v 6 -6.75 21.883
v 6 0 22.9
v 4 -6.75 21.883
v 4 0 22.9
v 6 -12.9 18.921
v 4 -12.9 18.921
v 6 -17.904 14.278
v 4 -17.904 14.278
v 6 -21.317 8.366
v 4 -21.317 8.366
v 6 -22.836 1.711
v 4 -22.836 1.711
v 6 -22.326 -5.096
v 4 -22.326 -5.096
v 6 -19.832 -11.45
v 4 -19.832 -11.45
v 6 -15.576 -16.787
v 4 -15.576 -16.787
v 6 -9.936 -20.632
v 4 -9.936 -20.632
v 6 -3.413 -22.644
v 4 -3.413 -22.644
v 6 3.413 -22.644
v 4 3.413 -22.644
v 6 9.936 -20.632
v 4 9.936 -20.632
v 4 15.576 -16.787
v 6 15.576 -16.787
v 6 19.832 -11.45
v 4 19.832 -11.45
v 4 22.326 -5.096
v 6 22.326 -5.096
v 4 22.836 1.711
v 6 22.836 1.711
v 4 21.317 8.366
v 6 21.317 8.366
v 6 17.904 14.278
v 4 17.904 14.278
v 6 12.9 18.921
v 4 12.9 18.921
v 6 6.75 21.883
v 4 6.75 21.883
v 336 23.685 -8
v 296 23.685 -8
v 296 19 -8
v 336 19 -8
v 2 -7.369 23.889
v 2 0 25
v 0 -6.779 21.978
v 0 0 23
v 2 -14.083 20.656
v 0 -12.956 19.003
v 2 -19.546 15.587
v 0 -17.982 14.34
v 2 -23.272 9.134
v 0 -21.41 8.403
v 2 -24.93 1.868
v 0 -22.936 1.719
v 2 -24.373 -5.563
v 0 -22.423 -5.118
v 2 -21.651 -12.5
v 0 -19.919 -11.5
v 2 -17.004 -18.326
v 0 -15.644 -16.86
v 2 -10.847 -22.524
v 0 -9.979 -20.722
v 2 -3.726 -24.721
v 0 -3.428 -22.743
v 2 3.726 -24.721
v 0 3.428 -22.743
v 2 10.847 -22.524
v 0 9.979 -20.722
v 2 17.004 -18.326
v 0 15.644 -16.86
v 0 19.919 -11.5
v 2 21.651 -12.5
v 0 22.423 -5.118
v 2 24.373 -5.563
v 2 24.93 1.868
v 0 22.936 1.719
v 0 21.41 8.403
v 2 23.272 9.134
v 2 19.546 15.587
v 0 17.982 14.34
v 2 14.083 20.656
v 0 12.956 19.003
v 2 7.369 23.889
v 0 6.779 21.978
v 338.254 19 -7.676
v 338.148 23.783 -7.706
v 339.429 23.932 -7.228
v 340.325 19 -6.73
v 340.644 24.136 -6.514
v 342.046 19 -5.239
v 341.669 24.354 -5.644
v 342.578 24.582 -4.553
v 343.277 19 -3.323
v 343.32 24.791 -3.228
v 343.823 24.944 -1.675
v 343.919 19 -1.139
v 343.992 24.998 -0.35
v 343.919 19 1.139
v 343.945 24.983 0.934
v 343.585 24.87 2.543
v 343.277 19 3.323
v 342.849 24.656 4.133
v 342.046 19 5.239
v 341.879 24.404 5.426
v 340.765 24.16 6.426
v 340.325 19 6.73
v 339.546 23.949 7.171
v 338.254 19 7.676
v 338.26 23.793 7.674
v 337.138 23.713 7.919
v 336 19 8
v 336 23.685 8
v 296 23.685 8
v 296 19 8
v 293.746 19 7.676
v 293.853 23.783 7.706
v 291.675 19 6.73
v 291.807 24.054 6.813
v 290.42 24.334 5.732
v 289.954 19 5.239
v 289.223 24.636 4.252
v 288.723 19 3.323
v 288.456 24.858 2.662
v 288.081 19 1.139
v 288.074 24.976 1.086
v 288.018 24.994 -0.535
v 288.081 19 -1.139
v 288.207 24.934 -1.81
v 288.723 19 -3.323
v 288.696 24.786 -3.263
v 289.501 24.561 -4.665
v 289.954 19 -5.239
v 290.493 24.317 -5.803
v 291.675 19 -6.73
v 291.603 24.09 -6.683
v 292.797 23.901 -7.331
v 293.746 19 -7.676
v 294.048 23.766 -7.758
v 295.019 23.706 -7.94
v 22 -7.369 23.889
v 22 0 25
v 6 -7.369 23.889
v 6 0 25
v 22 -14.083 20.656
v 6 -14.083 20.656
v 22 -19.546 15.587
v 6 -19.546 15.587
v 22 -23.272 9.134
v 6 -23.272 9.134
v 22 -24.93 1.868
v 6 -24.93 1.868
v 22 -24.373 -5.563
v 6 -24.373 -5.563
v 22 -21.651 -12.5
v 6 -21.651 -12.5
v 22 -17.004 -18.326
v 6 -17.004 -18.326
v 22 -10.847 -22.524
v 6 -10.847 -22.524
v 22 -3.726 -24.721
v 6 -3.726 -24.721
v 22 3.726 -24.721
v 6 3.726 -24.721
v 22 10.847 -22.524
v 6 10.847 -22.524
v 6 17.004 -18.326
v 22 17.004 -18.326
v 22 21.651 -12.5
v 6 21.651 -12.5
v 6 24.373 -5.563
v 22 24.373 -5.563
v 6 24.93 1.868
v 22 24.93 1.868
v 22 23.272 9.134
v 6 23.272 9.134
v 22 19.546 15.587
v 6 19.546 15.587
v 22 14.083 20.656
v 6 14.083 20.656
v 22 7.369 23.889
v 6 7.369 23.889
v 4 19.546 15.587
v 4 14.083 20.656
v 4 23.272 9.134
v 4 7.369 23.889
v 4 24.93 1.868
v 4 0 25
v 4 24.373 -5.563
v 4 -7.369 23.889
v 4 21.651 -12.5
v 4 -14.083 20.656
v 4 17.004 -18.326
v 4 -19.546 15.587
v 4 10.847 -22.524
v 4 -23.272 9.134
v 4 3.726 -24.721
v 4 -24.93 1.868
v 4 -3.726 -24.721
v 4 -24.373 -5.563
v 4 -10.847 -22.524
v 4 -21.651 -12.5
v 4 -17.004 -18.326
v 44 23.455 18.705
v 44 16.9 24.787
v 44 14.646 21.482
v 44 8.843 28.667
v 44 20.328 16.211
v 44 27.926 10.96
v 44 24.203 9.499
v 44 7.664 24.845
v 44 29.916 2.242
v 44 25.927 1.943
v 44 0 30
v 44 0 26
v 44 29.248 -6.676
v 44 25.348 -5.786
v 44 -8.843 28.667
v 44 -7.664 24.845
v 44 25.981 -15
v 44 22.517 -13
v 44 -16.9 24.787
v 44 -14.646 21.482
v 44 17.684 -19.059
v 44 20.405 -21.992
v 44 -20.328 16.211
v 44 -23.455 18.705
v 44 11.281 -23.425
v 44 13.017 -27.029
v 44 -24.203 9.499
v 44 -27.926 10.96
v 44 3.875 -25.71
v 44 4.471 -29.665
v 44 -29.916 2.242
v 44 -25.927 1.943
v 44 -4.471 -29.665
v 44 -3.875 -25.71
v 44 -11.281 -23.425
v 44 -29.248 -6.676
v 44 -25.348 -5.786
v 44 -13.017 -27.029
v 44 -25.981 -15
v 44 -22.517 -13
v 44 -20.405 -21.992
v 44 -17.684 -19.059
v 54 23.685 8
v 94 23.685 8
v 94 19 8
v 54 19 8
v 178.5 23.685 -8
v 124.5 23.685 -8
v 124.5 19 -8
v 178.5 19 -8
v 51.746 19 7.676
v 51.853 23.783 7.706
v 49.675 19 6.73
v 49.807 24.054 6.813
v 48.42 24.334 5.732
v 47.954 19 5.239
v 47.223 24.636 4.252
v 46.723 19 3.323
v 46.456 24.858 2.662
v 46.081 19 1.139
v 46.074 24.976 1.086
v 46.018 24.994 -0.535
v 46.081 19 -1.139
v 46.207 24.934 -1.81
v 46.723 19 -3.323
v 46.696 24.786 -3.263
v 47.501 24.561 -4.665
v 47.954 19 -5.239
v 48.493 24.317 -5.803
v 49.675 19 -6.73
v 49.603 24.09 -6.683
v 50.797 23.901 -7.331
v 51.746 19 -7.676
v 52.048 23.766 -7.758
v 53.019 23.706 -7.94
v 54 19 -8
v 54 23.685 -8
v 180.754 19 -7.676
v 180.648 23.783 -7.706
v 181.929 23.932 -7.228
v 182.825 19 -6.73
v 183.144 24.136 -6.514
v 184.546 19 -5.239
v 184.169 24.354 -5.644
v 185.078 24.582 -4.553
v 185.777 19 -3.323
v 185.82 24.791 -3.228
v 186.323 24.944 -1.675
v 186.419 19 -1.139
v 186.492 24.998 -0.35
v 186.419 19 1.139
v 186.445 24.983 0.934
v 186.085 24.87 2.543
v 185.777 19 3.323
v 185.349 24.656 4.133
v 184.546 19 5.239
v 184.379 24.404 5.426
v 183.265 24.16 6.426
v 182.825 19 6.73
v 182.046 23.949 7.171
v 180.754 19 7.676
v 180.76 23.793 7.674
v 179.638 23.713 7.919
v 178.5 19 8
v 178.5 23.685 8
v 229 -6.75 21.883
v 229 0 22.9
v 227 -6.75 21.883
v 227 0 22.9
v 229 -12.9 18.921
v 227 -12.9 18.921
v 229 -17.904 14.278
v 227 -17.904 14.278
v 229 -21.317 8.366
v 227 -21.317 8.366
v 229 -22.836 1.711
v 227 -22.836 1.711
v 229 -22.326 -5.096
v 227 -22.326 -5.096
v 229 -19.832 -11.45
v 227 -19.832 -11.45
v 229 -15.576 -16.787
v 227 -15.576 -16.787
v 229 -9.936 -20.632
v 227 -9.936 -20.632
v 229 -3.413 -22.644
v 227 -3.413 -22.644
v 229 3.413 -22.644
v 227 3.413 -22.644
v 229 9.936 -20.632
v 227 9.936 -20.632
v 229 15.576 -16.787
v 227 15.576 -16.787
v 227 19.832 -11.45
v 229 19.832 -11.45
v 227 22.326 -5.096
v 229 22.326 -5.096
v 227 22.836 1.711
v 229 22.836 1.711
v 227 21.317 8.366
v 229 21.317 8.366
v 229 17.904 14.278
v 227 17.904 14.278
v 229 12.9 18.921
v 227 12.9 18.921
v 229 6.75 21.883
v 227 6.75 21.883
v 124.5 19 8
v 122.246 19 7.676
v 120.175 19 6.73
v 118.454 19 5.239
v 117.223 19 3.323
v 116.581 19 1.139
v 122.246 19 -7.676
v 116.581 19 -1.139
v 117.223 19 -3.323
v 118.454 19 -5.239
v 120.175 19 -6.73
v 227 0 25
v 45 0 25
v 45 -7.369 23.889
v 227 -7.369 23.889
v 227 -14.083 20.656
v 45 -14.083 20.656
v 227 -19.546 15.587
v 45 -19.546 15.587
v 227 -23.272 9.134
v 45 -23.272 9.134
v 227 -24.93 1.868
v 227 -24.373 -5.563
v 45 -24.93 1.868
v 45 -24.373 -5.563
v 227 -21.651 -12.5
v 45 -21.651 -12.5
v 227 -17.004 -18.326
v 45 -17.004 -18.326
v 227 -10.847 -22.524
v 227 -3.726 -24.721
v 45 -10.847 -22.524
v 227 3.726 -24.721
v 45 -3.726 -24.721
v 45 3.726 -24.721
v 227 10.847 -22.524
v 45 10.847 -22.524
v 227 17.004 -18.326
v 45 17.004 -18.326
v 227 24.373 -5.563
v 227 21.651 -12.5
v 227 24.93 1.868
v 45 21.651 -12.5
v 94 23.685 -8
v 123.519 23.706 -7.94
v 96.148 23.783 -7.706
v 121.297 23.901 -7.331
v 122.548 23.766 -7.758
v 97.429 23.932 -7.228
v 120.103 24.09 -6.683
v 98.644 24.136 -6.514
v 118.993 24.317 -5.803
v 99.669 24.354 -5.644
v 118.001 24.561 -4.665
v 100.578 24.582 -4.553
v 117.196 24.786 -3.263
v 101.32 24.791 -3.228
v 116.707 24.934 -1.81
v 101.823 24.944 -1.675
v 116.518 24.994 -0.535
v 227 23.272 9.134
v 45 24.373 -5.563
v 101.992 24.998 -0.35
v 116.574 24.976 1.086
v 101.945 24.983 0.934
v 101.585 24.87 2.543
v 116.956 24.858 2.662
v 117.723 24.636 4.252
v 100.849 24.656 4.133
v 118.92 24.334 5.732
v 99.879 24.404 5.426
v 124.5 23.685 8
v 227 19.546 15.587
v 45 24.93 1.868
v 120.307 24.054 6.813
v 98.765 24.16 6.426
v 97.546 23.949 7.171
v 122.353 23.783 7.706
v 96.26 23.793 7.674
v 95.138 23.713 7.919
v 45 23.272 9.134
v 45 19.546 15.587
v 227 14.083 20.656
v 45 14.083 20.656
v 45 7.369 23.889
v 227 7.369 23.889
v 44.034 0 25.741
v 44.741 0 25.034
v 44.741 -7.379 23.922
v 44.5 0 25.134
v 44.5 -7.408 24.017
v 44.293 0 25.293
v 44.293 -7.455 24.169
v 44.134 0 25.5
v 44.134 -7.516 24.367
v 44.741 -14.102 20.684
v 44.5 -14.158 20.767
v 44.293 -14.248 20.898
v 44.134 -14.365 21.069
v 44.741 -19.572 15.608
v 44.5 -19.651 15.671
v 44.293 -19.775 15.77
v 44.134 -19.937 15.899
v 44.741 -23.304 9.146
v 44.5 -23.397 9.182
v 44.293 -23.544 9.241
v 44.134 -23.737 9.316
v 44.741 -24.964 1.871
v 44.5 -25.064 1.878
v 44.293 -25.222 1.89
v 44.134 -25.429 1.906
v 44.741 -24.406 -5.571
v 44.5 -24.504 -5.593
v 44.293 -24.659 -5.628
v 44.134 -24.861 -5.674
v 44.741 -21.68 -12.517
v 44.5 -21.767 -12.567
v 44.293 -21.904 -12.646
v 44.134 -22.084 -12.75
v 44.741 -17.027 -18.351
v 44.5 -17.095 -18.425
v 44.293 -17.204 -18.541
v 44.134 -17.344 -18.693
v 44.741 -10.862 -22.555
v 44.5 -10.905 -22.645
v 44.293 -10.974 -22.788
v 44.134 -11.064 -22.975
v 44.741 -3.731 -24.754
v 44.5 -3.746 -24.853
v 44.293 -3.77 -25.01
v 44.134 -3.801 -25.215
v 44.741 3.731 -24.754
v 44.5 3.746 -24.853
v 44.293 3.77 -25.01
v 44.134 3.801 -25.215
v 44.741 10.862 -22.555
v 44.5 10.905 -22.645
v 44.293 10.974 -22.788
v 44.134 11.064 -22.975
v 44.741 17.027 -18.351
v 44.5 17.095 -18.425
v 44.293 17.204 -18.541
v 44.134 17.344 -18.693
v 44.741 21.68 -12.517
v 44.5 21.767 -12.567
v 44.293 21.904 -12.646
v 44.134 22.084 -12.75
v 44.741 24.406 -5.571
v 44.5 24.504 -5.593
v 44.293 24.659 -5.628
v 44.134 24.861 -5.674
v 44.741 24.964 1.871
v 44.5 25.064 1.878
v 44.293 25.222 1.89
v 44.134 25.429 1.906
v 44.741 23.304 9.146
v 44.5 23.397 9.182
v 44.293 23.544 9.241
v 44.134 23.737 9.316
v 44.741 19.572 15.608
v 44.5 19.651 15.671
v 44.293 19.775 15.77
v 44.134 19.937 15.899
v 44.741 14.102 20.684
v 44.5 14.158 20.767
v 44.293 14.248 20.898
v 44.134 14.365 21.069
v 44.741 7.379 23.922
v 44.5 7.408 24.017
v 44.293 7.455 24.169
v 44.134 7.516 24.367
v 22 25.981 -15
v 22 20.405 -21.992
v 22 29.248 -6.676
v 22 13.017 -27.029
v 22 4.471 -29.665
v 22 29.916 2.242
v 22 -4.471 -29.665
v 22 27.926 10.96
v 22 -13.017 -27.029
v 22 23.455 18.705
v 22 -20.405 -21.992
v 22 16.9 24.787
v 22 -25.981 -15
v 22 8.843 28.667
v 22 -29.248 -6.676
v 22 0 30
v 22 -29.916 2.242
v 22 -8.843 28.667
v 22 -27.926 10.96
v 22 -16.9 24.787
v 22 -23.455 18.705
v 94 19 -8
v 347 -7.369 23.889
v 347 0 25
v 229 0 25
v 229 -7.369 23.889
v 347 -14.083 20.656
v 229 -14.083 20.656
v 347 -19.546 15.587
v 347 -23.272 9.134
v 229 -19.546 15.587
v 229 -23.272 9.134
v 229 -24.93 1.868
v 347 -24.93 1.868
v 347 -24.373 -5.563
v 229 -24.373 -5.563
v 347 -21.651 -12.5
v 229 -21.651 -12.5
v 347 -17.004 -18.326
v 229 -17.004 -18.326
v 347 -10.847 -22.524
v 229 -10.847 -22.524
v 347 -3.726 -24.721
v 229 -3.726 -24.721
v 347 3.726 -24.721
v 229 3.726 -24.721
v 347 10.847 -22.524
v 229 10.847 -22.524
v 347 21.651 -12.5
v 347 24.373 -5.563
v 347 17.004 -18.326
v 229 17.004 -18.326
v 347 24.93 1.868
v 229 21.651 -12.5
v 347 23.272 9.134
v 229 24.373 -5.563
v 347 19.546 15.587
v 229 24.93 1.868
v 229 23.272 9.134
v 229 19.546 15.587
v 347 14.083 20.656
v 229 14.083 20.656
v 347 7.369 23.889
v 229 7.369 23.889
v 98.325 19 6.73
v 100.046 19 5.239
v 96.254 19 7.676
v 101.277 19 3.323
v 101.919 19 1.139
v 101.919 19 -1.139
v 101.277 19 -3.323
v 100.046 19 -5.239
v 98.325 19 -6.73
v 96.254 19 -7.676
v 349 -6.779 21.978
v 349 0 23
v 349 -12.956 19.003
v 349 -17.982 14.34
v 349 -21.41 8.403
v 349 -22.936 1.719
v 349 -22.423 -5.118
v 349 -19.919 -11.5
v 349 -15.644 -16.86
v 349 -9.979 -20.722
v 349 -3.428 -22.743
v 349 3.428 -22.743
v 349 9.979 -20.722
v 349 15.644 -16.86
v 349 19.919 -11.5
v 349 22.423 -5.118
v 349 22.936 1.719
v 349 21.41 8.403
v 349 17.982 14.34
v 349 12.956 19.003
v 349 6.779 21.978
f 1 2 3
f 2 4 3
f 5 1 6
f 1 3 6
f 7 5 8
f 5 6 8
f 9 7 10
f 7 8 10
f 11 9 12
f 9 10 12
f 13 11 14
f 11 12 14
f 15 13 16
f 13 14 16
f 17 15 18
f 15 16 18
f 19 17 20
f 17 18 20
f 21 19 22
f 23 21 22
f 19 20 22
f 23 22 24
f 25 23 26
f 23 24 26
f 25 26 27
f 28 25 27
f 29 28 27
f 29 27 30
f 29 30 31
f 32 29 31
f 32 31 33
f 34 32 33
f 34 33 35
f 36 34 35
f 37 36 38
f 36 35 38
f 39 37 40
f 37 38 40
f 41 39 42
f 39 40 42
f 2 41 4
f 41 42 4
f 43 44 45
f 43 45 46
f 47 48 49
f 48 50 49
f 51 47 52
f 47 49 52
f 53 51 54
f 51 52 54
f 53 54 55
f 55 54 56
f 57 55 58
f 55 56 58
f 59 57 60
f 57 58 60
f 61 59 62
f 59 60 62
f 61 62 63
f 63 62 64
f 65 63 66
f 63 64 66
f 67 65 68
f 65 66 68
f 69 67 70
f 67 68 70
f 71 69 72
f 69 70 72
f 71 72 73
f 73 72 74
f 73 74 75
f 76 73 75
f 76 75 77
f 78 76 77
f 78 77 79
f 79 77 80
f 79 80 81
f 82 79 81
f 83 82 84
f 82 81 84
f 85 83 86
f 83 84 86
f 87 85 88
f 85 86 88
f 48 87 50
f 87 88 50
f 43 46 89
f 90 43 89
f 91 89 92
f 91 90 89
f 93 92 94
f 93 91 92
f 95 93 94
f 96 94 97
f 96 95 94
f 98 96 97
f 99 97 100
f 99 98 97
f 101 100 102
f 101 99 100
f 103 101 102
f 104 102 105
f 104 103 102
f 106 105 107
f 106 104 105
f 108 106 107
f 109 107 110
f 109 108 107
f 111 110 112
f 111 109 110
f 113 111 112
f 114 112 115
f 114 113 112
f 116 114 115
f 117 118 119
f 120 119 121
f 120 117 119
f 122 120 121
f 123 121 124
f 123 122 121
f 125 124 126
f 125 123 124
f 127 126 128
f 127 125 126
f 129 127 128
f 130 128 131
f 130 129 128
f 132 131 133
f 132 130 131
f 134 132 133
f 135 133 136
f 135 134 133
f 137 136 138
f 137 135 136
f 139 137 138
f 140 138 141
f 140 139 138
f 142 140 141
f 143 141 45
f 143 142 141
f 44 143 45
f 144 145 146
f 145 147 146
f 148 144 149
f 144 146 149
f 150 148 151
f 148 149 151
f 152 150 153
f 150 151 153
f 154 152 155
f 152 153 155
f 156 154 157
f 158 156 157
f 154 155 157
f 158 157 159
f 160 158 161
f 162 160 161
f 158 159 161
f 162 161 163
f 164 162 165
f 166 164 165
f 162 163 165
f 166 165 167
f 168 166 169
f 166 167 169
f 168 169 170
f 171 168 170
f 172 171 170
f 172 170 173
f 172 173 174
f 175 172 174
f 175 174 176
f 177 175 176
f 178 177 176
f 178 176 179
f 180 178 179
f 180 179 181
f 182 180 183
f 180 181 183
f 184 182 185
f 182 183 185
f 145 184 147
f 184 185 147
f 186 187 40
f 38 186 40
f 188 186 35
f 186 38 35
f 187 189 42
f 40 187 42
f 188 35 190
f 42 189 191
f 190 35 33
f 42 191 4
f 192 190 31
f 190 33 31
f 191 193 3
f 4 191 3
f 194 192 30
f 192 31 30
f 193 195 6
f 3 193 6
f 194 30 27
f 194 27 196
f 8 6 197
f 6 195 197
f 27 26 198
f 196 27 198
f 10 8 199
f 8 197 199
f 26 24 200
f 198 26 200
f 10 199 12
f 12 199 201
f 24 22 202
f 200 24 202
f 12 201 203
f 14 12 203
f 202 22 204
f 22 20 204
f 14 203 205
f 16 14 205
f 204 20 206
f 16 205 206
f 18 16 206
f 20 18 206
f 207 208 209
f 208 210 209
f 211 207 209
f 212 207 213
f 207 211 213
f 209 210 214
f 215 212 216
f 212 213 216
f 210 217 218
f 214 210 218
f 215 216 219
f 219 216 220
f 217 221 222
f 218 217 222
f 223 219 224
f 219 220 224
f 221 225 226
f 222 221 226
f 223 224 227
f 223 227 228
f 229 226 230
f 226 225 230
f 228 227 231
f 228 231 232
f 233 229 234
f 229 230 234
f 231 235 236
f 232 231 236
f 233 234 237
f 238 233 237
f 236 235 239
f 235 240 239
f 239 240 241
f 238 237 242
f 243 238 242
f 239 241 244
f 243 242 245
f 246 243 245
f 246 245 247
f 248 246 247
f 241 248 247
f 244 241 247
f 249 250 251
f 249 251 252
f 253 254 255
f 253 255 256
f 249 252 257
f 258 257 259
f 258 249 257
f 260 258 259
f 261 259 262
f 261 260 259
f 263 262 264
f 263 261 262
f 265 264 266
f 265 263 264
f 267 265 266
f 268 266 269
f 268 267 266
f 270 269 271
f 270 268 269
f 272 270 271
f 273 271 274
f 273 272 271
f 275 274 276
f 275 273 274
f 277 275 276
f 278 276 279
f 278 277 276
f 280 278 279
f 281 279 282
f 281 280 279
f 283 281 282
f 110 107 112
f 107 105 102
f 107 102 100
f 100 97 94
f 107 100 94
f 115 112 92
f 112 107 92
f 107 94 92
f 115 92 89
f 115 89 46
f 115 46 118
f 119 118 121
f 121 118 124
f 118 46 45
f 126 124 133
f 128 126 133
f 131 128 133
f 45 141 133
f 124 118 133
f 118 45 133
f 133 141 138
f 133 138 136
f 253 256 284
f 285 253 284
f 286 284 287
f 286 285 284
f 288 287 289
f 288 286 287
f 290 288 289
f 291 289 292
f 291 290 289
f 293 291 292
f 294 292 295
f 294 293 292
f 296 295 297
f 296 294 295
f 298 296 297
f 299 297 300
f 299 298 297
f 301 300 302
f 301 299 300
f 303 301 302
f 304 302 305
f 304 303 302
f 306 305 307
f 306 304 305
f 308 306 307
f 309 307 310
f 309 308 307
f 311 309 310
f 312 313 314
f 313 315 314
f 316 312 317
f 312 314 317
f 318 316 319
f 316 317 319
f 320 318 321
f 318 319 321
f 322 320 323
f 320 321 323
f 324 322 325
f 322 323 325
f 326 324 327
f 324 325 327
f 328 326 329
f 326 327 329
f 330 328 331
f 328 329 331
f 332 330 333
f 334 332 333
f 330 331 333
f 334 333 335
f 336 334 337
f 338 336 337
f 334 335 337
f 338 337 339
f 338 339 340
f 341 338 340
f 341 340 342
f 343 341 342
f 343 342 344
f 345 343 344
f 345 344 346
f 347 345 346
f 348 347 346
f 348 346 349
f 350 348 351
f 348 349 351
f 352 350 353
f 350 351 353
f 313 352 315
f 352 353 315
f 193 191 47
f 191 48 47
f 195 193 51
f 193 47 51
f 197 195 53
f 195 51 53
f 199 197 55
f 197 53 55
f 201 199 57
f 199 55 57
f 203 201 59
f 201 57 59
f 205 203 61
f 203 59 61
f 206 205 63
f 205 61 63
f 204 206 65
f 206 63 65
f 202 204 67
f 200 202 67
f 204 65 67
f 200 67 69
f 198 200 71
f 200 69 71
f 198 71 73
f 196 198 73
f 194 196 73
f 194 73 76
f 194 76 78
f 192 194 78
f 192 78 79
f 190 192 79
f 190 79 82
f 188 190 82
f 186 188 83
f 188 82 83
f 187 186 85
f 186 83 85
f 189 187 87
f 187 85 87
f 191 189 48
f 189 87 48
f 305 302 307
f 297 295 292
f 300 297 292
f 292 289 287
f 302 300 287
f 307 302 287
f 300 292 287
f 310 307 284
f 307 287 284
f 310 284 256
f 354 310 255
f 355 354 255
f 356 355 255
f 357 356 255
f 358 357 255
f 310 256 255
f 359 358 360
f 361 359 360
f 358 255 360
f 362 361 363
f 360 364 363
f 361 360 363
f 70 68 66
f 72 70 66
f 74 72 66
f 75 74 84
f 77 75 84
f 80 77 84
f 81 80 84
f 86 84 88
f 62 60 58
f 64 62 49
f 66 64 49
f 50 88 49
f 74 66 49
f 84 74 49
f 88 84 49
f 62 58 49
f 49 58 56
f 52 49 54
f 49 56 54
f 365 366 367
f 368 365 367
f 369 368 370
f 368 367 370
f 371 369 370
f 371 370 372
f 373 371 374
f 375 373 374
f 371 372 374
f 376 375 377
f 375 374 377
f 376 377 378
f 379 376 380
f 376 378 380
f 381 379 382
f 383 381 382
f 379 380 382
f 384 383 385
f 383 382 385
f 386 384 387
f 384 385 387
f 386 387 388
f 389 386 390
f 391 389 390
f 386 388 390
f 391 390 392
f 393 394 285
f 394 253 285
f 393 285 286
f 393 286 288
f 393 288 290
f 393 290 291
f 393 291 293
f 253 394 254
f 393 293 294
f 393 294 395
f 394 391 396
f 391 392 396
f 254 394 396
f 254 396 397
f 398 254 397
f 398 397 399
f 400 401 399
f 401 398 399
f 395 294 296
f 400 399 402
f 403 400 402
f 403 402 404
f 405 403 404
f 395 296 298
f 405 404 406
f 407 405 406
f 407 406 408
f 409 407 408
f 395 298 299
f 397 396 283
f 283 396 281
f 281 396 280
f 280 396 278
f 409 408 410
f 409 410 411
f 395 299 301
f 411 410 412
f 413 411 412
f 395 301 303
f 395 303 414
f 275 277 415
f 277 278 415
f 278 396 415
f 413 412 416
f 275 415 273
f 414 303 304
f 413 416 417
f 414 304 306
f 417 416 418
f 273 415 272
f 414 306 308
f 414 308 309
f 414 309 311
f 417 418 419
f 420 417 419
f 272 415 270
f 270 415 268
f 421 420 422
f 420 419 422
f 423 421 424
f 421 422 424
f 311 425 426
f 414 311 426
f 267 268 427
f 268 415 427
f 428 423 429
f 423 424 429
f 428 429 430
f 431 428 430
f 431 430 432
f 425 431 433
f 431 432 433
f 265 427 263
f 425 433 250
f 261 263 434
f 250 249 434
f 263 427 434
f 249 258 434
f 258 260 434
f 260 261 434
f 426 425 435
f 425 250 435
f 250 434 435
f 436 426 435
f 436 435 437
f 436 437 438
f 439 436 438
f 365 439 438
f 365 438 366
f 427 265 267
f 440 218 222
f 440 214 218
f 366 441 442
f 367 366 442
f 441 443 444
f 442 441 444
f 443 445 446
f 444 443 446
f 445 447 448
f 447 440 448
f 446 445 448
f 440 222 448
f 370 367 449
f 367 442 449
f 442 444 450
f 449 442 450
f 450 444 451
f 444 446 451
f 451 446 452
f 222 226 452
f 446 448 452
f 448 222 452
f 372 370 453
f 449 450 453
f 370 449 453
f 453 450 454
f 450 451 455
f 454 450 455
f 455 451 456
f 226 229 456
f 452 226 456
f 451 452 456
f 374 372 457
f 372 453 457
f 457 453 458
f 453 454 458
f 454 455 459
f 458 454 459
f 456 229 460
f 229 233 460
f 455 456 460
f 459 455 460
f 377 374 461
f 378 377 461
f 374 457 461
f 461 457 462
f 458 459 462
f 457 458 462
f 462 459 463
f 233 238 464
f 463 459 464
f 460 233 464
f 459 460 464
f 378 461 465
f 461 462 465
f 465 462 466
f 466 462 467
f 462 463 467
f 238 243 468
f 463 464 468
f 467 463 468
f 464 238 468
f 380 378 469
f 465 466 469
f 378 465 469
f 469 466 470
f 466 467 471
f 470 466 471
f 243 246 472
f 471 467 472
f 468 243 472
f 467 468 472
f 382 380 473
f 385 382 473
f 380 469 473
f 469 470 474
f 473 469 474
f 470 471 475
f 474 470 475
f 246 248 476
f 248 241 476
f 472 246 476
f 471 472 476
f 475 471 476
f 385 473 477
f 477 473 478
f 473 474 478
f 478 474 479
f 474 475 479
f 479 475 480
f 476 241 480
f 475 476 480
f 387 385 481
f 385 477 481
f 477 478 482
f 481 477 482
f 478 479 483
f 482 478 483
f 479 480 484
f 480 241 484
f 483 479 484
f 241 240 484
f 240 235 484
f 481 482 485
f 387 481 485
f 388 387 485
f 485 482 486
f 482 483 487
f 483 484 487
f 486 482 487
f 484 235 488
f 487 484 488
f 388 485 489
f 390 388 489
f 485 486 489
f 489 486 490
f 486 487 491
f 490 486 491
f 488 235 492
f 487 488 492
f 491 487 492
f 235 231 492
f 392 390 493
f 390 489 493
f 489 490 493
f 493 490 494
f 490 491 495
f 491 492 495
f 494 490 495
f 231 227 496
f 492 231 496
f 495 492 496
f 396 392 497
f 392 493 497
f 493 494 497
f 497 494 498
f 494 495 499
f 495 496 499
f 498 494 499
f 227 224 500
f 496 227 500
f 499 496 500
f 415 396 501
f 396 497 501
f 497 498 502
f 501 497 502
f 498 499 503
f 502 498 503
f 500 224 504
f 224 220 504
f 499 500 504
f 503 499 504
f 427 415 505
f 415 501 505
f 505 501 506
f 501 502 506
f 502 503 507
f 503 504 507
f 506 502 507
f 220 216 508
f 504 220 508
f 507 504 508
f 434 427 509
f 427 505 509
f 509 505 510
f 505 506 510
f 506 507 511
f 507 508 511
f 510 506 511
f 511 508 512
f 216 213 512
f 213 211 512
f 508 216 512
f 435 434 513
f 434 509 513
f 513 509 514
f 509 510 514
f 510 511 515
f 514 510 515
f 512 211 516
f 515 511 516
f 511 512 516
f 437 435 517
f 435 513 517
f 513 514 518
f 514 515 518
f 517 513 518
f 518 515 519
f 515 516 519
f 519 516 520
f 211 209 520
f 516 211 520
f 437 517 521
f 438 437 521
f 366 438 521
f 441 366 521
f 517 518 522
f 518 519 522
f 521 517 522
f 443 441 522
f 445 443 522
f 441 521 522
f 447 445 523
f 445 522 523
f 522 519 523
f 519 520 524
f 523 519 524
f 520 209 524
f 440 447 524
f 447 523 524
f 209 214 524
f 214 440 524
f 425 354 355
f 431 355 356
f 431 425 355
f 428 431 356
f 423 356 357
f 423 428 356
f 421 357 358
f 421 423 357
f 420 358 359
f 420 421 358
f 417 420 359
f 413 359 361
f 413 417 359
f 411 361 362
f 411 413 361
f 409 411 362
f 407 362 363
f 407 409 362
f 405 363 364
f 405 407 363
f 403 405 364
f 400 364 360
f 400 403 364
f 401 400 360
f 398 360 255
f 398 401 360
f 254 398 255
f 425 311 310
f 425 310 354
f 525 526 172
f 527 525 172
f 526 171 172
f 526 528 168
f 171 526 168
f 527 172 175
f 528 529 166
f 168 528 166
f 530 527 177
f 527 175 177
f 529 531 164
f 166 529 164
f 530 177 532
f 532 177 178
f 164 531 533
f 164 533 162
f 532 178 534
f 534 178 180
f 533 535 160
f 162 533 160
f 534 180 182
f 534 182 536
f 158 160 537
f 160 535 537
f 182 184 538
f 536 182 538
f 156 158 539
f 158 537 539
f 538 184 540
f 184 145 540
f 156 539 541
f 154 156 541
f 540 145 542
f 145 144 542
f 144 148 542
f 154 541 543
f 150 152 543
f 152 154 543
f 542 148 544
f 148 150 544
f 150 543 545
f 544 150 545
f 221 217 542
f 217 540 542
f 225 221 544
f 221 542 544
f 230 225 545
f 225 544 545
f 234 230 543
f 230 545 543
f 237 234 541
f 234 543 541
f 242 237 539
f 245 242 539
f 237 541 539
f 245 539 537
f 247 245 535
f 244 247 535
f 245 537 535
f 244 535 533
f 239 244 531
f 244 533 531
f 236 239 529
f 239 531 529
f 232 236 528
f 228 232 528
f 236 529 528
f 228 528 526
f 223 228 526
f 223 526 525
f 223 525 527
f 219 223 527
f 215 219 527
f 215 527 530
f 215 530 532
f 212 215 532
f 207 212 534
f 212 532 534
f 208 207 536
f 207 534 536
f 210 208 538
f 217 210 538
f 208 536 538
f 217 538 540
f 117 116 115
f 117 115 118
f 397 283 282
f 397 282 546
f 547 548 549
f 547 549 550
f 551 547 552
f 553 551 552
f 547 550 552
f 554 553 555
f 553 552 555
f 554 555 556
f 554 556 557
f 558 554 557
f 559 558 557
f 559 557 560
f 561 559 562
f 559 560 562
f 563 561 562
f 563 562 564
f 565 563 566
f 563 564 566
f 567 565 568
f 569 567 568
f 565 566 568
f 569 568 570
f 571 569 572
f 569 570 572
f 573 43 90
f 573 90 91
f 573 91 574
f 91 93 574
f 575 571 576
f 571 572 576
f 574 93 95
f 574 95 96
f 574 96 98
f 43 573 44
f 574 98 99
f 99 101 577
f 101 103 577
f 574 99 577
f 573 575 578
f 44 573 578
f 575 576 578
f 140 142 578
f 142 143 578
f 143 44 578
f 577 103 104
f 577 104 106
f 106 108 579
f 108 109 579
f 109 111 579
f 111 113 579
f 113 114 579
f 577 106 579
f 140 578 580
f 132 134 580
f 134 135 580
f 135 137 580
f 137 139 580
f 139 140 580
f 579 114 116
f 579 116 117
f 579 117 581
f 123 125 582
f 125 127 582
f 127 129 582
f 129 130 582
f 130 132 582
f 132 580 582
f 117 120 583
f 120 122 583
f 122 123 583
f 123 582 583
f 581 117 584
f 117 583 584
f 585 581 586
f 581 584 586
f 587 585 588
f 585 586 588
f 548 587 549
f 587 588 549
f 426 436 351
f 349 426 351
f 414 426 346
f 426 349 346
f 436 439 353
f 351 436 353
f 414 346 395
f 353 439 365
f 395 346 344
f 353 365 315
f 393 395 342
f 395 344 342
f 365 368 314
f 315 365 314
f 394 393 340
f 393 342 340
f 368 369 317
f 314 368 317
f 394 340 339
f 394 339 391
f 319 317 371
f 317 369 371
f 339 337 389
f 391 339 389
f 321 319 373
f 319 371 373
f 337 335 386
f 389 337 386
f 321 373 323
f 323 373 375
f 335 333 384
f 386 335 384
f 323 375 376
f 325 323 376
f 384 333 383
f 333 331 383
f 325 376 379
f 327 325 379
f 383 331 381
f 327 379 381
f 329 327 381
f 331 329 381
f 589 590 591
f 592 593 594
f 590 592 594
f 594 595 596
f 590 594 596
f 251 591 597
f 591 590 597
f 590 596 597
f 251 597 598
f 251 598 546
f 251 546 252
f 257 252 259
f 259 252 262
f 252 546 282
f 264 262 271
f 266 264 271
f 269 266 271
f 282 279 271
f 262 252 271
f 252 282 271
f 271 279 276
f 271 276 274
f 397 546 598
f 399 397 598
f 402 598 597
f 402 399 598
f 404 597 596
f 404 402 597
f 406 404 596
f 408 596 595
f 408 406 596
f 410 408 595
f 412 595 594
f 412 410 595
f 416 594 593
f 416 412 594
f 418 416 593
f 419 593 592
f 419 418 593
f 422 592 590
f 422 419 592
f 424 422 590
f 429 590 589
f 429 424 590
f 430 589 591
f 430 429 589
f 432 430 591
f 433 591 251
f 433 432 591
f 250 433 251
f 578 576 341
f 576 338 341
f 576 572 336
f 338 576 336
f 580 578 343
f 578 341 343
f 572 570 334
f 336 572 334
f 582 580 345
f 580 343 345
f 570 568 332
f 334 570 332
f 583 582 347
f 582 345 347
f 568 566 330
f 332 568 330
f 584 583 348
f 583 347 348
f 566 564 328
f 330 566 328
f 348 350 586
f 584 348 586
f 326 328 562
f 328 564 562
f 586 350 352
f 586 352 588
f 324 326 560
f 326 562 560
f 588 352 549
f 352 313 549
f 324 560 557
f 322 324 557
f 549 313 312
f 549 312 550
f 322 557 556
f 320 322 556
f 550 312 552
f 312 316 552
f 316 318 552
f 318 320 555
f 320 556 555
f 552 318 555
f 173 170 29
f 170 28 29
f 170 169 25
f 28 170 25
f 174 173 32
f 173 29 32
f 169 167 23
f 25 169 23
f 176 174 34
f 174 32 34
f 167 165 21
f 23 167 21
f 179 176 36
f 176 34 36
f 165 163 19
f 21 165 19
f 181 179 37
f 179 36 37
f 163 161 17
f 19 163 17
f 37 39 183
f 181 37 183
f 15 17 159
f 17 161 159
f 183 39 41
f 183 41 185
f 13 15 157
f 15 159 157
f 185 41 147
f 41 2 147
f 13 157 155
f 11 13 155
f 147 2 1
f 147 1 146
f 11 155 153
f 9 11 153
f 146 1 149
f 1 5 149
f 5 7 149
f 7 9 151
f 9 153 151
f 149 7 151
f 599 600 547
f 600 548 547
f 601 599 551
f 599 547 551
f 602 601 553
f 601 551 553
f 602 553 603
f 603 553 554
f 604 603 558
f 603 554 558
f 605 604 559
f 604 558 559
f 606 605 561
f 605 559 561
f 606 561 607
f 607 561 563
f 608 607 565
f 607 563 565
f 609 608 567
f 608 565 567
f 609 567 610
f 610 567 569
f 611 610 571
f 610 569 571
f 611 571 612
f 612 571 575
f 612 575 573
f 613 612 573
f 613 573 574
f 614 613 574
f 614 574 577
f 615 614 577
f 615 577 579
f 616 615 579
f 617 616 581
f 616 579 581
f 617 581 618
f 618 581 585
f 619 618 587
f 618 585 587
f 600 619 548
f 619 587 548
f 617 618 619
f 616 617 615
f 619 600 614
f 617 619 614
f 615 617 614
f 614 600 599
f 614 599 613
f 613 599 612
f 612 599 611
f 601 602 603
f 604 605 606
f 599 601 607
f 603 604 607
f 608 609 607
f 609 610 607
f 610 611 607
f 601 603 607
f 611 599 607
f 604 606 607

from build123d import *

# Parameters (mm, degrees)
CUT_EXTRUDE1_DEPTH = 6
CUT_EXTRUDE2_DEPTH = 6
FILLET1_R          = 1
CUT_EXTRUDE3_DEPTH = 6


with BuildPart() as part:
    # Sketch1 → Revolve1 (revolve)
    with BuildSketch(Plane.XY, mode=Mode.PRIVATE) as revolve1_sk:
        Polygon((0, 0), (349, 0), (349, 23), (347, 25), (229, 25), (229, 22.9), (227, 22.9), (227, 25), (44, 25), (44, 30), (22, 30), (22, 25), (6, 25), (6, 22.9), (4, 22.9), (4, 25), (2, 25), (0, 23), align=None)
    revolve(revolve1_sk.sketch.rotate(Axis((0, 0, 0), (1, 0, 0)), 90), axis=Axis((0, 0, 0), (1, 0, 0)))

    # Sketch2 → Cut-Extrude1 (cut)
    with BuildSketch(Plane(origin=(0, 25, 0), x_dir=(1, 0, 0), z_dir=(0, 1, 0))):
        with BuildLine():
            Line((54, 8), (94, 8))
            ThreePointArc((94, 8), (102, 0), (94, -8))
            Line((94, -8), (54, -8))
            ThreePointArc((54, -8), (46, 0), (54, 8))
        make_face()
    extrude(amount=-CUT_EXTRUDE1_DEPTH, mode=Mode.SUBTRACT)

    # Sketch3 → Cut-Extrude2 (cut)
    with BuildSketch(Plane(origin=(0, 25, 0), x_dir=(1, 0, 0), z_dir=(0, 1, 0))):
        with BuildLine():
            Line((124.5, 8), (178.5, 8))
            ThreePointArc((178.5, 8), (186.5, 0), (178.5, -8))
            Line((178.5, -8), (124.5, -8))
            ThreePointArc((124.5, -8), (116.5, 0), (124.5, 8))
        make_face()
    extrude(amount=-CUT_EXTRUDE2_DEPTH, mode=Mode.SUBTRACT)

    # Fillet1
    fillet1_edges = [part.edges().sort_by_distance(p)[0] for p in [
        (44, 0, -25),
    ]]
    fillet(fillet1_edges, radius=FILLET1_R)

    # Sketch4 → Cut-Extrude3 (cut)
    with BuildSketch(Plane(origin=(0, 25, 0), x_dir=(1, 0, 0), z_dir=(0, 1, 0))):
        with BuildLine():
            Line((296, 8), (336, 8))
            ThreePointArc((336, 8), (344, 0), (336, -8))
            Line((336, -8), (296, -8))
            ThreePointArc((296, -8), (288, 0), (296, 8))
        make_face()
    extrude(amount=-CUT_EXTRUDE3_DEPTH, mode=Mode.SUBTRACT)


solid = part.part
